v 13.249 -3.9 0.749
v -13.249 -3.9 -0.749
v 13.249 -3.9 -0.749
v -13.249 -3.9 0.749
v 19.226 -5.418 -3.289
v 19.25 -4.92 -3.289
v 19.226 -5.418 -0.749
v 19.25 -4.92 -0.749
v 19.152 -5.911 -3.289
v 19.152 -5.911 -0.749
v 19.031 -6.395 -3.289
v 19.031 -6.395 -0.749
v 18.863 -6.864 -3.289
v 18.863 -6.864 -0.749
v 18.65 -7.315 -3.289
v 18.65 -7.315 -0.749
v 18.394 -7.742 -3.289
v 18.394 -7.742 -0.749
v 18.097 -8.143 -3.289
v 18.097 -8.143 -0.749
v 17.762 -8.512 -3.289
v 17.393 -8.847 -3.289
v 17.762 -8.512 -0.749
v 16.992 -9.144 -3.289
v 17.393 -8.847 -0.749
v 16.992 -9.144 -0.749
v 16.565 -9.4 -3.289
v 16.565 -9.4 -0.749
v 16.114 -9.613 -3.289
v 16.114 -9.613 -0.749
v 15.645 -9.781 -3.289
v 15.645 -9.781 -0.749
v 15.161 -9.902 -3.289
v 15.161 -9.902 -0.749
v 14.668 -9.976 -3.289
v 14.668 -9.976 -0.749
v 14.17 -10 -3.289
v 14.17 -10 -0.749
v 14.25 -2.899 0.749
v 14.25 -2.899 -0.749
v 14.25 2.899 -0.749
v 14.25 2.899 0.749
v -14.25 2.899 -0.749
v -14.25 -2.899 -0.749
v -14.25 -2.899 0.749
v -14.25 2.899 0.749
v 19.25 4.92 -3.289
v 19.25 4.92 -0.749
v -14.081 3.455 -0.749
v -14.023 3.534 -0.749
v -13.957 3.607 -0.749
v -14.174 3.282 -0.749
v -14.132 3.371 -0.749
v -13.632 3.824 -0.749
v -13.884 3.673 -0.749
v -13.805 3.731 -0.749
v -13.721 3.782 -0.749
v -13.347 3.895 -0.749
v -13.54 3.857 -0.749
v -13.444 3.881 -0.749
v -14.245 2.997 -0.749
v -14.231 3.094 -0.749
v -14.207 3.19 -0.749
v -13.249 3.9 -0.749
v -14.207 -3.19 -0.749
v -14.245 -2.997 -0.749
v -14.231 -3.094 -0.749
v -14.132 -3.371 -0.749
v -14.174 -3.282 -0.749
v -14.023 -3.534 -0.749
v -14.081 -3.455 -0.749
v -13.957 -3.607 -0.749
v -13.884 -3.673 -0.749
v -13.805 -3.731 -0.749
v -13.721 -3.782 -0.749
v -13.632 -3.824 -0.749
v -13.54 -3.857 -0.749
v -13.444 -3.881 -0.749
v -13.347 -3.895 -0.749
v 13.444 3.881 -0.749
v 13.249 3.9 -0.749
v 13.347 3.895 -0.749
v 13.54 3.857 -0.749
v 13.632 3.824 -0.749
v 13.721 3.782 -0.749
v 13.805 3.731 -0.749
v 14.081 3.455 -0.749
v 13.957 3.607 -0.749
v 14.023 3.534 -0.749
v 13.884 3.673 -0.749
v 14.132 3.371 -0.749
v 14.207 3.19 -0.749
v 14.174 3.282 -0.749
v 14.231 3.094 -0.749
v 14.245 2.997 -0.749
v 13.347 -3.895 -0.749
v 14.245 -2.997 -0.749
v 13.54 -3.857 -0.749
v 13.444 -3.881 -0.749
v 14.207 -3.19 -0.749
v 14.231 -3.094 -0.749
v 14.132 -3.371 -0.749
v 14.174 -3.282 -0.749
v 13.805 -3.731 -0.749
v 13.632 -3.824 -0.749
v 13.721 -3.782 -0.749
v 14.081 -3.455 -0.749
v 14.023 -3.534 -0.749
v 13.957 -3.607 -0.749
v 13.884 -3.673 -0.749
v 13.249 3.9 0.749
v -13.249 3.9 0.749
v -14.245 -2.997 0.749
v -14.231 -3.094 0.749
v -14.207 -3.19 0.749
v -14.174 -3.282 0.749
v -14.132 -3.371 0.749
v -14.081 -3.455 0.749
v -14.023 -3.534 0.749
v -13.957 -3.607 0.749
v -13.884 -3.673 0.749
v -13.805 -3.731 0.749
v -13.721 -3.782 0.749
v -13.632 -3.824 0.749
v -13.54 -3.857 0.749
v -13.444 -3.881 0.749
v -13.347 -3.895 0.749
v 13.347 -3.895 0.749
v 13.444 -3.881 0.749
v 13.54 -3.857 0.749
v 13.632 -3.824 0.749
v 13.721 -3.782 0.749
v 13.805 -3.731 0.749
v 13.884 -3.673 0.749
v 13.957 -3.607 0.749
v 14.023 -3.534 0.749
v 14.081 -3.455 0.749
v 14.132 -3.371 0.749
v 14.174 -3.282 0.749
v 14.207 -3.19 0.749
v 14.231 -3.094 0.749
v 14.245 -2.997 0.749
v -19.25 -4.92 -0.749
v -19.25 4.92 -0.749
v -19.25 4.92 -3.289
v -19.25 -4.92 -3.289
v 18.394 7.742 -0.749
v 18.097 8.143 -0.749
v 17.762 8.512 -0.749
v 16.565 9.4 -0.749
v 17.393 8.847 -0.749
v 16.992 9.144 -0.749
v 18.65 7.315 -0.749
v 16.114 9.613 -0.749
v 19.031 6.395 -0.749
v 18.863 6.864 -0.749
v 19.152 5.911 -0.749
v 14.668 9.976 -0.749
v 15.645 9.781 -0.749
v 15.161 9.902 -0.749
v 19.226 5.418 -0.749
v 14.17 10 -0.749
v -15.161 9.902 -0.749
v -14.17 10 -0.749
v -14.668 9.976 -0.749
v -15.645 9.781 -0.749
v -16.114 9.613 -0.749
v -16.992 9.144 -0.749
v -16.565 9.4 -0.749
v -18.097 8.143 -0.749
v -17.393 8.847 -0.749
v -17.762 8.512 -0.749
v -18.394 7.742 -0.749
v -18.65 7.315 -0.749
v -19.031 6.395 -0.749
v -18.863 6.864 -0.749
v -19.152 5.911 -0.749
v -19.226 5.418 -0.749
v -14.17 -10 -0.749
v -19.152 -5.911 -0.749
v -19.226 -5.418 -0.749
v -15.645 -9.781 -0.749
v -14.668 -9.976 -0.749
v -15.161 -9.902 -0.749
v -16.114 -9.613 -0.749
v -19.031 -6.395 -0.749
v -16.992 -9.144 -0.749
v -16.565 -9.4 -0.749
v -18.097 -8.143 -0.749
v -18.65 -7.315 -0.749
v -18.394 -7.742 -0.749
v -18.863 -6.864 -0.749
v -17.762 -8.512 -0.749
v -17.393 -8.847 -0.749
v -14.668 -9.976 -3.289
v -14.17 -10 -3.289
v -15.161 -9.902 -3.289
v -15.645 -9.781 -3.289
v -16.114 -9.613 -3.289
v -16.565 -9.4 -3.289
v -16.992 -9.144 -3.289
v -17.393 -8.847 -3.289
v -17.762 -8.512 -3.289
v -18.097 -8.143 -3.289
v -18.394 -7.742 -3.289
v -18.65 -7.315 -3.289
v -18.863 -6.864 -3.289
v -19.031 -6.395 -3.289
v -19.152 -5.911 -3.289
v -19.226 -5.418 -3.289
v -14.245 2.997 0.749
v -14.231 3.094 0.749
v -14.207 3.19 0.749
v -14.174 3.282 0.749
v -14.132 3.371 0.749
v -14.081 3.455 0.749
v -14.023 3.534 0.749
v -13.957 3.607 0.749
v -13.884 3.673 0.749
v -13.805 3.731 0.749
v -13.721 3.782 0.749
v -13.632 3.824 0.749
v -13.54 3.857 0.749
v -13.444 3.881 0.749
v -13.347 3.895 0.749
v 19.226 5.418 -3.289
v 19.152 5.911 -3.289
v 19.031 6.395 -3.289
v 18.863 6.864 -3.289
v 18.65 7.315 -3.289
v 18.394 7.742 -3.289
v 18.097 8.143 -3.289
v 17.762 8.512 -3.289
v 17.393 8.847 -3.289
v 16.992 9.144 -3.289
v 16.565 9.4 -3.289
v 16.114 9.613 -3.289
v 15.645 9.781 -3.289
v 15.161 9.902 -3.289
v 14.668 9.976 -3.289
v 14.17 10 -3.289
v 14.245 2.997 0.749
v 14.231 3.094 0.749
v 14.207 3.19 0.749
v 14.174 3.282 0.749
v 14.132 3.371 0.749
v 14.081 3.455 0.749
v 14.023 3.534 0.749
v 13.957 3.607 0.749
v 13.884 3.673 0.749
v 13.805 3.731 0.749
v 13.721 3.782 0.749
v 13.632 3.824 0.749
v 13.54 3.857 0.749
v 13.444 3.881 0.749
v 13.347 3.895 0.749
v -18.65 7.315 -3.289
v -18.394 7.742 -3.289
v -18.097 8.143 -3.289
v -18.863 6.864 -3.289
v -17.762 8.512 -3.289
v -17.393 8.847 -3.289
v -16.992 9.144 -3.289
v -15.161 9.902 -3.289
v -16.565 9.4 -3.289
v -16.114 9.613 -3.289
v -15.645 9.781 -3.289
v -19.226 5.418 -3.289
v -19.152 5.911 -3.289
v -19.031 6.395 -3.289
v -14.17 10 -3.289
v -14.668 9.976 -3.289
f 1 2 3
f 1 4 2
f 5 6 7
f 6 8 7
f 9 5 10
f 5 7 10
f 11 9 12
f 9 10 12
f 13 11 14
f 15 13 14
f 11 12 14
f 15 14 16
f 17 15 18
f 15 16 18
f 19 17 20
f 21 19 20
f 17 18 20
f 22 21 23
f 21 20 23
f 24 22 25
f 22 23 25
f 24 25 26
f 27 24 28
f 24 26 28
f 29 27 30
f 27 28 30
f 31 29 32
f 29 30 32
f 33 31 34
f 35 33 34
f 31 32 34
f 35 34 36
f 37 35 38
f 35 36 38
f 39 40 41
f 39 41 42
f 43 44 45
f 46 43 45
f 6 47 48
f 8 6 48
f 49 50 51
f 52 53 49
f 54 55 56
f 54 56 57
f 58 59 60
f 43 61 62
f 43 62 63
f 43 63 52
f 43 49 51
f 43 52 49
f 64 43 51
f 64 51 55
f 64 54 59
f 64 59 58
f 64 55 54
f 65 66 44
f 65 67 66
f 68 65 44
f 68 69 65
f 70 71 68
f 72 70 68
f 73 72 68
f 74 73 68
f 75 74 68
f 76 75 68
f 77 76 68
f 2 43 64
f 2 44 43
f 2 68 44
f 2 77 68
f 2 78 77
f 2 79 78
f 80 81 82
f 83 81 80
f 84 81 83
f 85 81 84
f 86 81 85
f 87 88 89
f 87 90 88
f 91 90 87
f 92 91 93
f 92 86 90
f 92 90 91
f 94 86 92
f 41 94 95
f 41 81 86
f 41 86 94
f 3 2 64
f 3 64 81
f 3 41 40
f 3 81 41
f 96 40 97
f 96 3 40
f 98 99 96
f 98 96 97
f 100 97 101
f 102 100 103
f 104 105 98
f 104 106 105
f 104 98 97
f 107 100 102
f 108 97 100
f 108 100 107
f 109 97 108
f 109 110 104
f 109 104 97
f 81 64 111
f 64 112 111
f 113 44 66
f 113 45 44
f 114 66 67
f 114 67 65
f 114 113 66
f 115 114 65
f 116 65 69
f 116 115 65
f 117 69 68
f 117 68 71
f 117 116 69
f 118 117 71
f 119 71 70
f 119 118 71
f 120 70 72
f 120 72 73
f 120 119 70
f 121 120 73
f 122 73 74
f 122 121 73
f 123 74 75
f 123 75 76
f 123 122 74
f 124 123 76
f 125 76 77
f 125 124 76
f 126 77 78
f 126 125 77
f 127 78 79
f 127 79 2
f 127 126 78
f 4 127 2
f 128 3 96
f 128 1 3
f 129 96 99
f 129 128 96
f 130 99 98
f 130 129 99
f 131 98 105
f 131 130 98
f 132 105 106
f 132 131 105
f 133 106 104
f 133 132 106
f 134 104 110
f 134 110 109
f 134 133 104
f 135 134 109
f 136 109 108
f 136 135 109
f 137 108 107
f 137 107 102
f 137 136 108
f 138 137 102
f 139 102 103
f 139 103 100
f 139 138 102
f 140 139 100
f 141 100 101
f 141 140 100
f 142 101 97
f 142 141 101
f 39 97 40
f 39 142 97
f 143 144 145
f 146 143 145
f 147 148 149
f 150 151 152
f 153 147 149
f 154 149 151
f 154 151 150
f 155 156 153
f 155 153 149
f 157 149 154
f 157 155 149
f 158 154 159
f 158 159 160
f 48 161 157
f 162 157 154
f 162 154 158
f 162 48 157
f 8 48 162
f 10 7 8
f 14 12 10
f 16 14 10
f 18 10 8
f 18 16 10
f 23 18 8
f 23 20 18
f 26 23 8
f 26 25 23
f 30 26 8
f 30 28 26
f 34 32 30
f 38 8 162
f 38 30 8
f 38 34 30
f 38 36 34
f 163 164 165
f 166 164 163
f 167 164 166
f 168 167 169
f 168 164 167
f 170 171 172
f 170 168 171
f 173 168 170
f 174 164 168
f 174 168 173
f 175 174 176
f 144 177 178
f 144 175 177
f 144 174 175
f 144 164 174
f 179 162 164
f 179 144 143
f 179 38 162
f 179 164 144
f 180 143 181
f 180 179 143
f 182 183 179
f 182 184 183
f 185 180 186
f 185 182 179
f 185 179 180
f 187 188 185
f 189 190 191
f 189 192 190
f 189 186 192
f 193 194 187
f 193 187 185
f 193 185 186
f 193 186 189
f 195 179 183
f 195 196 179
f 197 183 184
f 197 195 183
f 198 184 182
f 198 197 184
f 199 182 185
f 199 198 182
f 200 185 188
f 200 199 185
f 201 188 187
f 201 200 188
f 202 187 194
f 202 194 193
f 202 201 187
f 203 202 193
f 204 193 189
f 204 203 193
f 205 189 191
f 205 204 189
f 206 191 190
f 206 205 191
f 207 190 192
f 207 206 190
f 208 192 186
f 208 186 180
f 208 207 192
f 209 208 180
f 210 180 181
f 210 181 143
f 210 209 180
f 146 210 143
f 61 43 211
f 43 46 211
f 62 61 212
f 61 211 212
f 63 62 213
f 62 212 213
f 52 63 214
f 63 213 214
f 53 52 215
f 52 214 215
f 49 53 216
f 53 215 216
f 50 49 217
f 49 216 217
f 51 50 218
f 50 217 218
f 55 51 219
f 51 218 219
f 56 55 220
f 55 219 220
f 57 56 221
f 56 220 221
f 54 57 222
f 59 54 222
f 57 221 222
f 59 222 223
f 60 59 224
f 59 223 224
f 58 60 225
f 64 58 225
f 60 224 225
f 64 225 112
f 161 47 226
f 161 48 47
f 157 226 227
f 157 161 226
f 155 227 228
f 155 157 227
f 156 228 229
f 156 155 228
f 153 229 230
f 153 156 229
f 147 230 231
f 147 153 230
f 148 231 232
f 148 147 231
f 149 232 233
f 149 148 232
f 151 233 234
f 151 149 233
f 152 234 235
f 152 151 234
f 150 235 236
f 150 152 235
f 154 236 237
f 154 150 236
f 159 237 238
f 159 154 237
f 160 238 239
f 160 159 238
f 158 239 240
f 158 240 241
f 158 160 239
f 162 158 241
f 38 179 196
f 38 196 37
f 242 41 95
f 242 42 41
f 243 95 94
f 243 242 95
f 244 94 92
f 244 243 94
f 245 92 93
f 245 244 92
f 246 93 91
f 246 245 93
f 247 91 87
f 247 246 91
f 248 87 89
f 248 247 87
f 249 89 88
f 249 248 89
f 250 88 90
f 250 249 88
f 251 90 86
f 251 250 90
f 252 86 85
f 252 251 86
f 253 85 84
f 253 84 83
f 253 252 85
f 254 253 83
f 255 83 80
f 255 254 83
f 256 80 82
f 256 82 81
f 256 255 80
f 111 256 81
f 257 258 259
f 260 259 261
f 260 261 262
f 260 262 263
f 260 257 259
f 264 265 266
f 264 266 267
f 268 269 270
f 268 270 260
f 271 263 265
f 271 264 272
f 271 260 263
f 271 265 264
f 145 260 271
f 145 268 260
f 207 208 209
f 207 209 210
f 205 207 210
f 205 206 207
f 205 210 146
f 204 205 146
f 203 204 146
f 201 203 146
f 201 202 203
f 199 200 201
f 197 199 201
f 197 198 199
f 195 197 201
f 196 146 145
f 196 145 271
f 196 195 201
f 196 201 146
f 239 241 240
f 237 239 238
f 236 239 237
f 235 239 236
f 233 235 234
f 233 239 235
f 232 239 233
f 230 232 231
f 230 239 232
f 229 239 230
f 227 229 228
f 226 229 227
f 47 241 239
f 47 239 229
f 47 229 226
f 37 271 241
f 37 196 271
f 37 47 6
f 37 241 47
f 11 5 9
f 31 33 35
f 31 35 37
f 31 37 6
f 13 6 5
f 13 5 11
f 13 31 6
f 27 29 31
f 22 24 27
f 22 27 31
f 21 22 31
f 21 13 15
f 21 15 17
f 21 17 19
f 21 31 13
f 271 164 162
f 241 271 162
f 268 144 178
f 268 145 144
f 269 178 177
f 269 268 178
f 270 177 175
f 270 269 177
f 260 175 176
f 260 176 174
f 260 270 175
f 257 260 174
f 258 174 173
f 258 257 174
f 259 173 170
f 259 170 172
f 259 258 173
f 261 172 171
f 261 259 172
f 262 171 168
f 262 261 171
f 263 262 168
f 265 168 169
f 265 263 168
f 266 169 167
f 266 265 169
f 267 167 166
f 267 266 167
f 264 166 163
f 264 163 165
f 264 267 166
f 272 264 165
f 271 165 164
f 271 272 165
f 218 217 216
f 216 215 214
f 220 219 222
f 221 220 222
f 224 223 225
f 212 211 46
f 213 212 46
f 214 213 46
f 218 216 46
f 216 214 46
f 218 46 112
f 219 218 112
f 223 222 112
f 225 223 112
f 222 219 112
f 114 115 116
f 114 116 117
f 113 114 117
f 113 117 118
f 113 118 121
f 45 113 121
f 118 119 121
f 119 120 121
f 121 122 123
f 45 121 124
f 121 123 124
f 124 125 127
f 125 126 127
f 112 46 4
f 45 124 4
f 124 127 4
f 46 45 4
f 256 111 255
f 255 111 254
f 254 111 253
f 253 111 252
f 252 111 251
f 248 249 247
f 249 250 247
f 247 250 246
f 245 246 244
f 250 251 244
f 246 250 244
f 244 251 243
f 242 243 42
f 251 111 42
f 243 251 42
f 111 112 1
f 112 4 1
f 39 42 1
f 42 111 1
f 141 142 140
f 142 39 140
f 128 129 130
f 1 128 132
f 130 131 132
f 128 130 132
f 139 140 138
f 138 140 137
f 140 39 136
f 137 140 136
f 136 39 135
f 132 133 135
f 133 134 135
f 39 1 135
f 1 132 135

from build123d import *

# Parameters (mm, degrees)
F0_W     = 28.5
F0_H     = 1.4986
F1_DEPTH = 3.9
F2_R     = 1.00076
F3_DEPTH = 10
F4_R     = 5.08


with BuildPart() as f1:
    # F0 (on Front) → F1 (new body, symmetric)
    with BuildSketch(Plane.XZ):
        Rectangle(F0_W, F0_H)
    extrude(amount=F1_DEPTH, both=True)

    # F2
    f2_edges = [f1.edges().sort_by_distance(p)[0] for p in [
        (-14.25, -3.9, 0),
        (-14.25, 3.9, 0),
        (14.25, 3.9, 0),
        (14.25, -3.9, 0),
    ]]
    fillet(f2_edges, radius=F2_R)


with BuildPart() as f3:
    # F0 (on Front) → F3 (new body, symmetric)
    with BuildSketch(Plane.XZ):
        Polygon((19.25, -0.7493), (14.25, -0.7493), (-14.25, -0.7493), (-19.25, -0.7493), (-19.25, -3.2893), (19.25, -3.2893), align=None)
    extrude(amount=F3_DEPTH, both=True)

    # F4
    f4_edges = [f3.edges().sort_by_distance(p)[0] for p in [
        (-19.25, -10, -2.0193),
        (19.25, -10, -2.0193),
        (19.25, 10, -2.0193),
        (-19.25, 10, -2.0193),
    ]]
    fillet(f4_edges, radius=F4_R)


solid = Compound([f1.part, f3.part])
